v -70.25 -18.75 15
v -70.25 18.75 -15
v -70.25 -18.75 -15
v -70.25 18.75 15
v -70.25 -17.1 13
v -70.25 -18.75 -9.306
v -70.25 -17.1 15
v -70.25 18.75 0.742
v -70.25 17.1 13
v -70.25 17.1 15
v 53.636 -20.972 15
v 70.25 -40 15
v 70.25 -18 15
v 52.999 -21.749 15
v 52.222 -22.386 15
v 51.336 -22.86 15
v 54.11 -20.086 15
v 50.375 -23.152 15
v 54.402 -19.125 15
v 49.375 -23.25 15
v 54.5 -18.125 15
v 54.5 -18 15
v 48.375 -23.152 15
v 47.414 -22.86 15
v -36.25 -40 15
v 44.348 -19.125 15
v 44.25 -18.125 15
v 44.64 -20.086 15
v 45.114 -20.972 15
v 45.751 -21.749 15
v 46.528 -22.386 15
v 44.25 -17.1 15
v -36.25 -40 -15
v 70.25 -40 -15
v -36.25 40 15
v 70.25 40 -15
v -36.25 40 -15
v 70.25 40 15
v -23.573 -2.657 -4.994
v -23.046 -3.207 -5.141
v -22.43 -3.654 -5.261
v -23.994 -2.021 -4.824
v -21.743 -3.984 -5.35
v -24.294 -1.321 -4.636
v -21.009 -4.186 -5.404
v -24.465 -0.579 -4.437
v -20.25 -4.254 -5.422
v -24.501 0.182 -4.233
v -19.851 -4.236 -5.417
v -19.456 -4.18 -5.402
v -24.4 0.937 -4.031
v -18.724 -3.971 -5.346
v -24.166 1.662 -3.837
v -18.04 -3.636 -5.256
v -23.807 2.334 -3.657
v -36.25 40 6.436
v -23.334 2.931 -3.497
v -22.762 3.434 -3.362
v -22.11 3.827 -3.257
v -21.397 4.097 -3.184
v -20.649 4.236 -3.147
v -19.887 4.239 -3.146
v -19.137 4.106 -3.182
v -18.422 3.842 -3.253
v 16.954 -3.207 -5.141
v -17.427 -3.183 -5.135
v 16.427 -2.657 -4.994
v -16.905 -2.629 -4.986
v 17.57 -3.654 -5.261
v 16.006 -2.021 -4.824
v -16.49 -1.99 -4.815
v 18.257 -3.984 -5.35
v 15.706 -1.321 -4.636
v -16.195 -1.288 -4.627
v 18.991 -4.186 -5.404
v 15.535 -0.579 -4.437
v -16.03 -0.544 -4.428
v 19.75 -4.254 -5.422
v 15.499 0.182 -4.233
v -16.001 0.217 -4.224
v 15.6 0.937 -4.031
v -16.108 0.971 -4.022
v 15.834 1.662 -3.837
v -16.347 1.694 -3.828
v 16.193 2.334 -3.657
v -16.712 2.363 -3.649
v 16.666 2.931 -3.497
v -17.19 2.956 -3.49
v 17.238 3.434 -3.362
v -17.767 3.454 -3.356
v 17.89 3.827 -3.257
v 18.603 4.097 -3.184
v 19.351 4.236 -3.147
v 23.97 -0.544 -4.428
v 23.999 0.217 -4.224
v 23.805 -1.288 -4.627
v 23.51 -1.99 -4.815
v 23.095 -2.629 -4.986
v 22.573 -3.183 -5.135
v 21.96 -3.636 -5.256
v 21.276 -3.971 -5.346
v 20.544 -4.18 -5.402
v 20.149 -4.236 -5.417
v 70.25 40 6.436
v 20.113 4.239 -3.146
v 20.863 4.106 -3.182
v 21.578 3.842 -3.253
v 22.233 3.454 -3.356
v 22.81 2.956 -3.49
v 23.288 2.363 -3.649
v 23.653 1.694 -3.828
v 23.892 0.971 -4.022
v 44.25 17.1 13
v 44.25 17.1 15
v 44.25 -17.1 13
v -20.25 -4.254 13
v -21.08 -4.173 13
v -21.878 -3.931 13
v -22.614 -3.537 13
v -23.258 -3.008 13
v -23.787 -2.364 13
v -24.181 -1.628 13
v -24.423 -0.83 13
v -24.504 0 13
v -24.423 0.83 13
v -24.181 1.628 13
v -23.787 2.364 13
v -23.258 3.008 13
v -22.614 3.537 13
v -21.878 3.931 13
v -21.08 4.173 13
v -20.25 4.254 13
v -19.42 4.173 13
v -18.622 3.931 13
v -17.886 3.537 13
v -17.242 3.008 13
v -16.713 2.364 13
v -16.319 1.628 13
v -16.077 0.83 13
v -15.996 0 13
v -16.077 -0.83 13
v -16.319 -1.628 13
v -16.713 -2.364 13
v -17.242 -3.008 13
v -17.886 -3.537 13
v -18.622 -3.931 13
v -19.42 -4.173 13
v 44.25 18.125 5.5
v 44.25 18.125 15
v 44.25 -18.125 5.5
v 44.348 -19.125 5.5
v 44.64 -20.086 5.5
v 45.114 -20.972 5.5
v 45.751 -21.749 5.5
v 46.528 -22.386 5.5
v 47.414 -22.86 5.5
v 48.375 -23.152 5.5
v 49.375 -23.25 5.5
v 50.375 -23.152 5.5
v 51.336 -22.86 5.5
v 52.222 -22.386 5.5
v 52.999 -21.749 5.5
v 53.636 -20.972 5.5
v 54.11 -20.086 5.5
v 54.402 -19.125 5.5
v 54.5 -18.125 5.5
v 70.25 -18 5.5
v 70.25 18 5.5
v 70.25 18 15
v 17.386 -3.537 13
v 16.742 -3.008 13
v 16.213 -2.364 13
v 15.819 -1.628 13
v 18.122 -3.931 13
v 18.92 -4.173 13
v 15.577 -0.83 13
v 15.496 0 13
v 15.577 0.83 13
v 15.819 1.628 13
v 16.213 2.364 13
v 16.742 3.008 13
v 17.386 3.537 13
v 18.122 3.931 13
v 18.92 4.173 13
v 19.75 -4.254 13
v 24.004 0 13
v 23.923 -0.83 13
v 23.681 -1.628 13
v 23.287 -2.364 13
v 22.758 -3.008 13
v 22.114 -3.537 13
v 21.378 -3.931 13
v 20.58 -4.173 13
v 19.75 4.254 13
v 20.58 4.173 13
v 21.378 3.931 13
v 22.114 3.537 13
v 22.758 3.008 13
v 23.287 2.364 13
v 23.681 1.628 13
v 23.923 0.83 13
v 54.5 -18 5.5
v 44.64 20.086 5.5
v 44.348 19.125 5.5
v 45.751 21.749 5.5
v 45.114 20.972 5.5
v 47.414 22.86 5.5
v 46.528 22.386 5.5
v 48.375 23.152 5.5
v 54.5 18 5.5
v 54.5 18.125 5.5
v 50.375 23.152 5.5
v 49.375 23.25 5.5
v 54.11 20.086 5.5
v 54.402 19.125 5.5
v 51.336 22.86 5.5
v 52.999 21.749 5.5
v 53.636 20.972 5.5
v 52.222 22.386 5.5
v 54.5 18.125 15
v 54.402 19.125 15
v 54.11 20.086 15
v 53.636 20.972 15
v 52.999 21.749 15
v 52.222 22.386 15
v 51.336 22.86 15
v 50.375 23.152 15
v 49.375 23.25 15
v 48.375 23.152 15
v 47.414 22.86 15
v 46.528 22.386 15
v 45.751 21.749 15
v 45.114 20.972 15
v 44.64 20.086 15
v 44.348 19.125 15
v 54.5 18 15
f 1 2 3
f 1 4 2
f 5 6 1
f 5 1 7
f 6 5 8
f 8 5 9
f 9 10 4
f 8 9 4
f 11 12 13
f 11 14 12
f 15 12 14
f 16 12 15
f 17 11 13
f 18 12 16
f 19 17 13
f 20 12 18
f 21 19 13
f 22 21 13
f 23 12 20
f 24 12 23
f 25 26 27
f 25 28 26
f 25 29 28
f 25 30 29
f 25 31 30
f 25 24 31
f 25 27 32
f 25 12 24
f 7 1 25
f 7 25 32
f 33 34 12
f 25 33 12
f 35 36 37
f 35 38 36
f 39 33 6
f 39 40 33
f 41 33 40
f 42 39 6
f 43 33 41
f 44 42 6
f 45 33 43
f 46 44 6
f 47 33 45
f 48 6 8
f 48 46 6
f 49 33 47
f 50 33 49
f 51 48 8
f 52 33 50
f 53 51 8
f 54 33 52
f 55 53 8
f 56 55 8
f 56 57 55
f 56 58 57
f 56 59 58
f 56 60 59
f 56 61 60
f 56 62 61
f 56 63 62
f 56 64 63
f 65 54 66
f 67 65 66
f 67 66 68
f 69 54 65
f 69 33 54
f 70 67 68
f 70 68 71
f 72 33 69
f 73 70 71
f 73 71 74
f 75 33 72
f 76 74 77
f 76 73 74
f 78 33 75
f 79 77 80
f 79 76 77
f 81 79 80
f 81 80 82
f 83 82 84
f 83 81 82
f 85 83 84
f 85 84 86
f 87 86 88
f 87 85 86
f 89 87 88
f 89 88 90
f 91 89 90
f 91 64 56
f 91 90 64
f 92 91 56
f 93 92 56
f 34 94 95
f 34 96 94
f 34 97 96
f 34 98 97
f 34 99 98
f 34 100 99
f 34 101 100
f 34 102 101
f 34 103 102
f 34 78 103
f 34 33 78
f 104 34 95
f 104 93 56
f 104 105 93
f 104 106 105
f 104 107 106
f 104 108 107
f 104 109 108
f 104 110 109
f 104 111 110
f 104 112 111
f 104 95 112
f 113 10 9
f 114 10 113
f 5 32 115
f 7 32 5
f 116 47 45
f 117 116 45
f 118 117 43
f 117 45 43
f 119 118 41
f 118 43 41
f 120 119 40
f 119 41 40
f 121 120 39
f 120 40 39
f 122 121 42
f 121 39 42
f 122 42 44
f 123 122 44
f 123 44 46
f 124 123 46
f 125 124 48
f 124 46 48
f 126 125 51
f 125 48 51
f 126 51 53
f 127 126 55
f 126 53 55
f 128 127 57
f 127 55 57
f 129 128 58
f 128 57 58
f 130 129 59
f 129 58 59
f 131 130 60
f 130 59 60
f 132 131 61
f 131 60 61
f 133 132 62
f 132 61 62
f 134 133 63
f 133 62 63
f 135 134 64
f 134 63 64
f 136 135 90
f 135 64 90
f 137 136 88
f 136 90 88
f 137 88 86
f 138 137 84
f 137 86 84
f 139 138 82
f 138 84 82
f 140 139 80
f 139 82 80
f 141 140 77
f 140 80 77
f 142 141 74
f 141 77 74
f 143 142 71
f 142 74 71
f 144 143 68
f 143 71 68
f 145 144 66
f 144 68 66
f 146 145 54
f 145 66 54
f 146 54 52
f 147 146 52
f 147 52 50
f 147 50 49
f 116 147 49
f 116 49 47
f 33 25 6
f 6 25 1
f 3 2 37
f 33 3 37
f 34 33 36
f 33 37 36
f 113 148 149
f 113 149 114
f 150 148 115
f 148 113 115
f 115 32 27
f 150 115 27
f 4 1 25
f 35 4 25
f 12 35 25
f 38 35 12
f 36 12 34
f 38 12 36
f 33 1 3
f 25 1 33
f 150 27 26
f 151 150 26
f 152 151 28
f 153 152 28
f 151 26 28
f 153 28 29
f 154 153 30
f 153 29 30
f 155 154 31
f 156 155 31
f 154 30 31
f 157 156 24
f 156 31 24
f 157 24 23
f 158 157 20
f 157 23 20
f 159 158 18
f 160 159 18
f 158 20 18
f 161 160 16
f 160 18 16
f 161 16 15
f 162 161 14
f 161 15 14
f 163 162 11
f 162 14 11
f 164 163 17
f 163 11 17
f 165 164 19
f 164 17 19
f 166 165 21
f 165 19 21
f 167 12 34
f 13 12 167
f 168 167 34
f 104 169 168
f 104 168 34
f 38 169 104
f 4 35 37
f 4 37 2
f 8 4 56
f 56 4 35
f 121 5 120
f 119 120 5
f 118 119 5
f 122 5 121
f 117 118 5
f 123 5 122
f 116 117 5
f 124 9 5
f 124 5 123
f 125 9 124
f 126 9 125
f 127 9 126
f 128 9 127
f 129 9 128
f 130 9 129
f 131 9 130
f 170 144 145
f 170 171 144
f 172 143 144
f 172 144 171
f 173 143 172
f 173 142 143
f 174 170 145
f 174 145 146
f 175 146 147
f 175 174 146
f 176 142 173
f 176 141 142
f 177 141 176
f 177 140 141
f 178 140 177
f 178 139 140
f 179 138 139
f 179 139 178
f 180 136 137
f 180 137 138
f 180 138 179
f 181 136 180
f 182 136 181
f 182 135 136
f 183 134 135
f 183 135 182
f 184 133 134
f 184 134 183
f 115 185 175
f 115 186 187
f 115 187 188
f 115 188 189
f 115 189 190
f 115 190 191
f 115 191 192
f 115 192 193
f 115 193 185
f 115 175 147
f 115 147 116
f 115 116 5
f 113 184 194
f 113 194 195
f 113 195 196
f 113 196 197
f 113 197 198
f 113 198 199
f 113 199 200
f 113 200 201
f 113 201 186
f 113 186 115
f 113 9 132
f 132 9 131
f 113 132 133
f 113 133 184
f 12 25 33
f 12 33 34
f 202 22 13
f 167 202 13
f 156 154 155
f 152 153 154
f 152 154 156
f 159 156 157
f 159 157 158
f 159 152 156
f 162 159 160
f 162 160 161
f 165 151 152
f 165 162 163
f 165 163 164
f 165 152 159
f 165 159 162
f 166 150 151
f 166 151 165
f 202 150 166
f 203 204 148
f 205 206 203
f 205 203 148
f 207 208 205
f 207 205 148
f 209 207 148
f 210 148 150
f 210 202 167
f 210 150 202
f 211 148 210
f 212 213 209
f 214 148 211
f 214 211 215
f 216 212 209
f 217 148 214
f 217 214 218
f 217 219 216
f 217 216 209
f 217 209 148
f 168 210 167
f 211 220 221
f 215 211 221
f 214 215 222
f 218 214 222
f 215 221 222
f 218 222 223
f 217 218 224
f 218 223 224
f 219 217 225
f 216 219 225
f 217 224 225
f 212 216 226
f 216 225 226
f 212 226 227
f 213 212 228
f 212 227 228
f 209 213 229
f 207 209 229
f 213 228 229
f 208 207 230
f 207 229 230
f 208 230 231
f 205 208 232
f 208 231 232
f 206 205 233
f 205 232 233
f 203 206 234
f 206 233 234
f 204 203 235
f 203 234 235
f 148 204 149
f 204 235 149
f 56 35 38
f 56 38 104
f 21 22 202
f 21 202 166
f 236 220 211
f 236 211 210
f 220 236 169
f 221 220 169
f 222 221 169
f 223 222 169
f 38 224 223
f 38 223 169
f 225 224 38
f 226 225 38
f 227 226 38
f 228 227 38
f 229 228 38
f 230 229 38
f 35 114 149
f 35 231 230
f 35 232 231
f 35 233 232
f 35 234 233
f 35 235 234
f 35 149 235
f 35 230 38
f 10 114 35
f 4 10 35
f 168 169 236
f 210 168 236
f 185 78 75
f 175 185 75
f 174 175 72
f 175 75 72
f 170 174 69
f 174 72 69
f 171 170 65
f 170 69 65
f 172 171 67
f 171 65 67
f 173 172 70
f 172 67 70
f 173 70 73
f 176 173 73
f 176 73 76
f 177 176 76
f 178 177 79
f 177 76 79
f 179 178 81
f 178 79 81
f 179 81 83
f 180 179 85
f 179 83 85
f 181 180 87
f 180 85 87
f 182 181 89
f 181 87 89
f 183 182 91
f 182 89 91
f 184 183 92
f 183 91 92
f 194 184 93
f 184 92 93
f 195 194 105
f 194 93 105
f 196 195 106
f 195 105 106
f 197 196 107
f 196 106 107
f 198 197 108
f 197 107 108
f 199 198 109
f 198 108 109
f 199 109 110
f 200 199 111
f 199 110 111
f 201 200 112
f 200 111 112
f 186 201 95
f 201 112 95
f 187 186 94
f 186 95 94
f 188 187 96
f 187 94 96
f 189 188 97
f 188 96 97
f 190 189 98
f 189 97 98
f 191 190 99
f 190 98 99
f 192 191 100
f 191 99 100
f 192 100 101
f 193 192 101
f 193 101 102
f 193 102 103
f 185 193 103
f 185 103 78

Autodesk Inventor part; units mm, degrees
ref_plane "Work Plane1" through (-36.25, -40, 33.1737) normal (0, 0, -1) x (-1, 0, 0)
ref_plane "Right" through (0, 0, 0) normal (1, 0, 0) x (0, 1, 0)
ref_plane "Top" through (0, 0, 0) normal (0, 1, 0) x (-1, 0, 0)
sketch "Sketch1" plane through (0, 0, 0) normal (1, 0, 0) x (0, 1, 0)
  line L0 (-40, 15) -> (40, 15)
  line L1 (40, 15) -> (40, -15)
  line L2 (40, -15) -> (-40, -15)
  line L3 (-40, -15) -> (-40, 15)
  line L4 (-40, 15) -> (40, -15) construction
  line L5 (40, 15) -> (-40, -15) construction
  point P0 (0, 0)
  dimension "d0" = 30
  dimension "d1" = 80
extrude "Extrusion1" add sketch "Sketch1" along normal mid plane 140.5
sketch "Sketch2" plane through (-70.25, -40, 15) normal (0, 0, 1) x (1, 0, 0)
  line L0 (140.5, 80) -> (0, 80) construction
  line L1 (0, 0) -> (0, 80) construction
  line L2 (0, 80) -> (0, 58.75)
  line L3 (0, 58.75) -> (34, 80)
  line L4 (34, 80) -> (0, 80)
  line L5 (0, 21.25) -> (0, 0)
  line L6 (0, 0) -> (34, 0)
  line L7 (34, 0) -> (0, 21.25)
  point P0 (70.25, 40)
  dimension "d4" = 37.5
  dimension "d5" = 106.5
  dimension "d6" = 147.995
extrude "Extrusion2" cut sketch "Sketch2" against normal through all
sketch "Sketch3" plane through (70.25, -40, 15) normal (0, 0, 1) x (1, 0, 0)
  line L0 (0, 80) -> (0, 0) construction
  line L1 (-140.5, 21.25) -> (-140.5, 58.75) construction
  line L2 (-140.5, 57.1) -> (0, 57.1)
  line L3 (0, 57.1) -> (0, 22.9)
  line L4 (0, 22.9) -> (-140.5, 22.9)
  line L5 (-140.5, 22.9) -> (-140.5, 57.1)
  point P0 (-70.25, 40)
  point P1 (-140.5, 40)
  dimension "d9" = 34.2
extrude "Extrusion3" cut sketch "Sketch3" against normal blind 2
sketch "Sketch4" plane through (-36.25, 40, 15) normal (0, 0, 1) x (1, 0, 0)
  line L0 (106.5, -57.1) -> (-34, -57.1) construction
  line L1 (-34, -58.75) -> (-34, -57.1) construction
  line L2 (-34, -58.75) -> (0, -80) construction
  line L3 (0, -80) -> (106.5, -80) construction
  line L4 (106.5, -57.1) -> (106.5, -80) construction
  line L5 (-34, -22.9) -> (106.5, -22.9) construction
  line L6 (-34, -57.1) -> (-34, -22.9) construction
  line L7 (106.5, -57.1) -> (-34, -57.1) construction
  line L8 (106.5, -22.9) -> (106.5, -57.1) construction
  line L9 (106.5, -22) -> (80.5, -22)
  line L10 (80.5, -22) -> (80.5, -58)
  line L11 (80.5, -58) -> (106.5, -58)
  line L12 (106.5, -58) -> (106.5, -22)
  line L13 (85.625, -21.875) -> (85.625, -58.125) construction
  line L14 (90.75, -21.875) -> (90.75, -58.125)
  line L15 (80.5, -58.125) -> (80.5, -21.875)
  arc A0 (90.75, -21.875) -> (80.5, -21.875) centre (85.625, -21.875) ccw
  arc A1 (80.5, -58.125) -> (90.75, -58.125) centre (85.625, -58.125) ccw
  point P0 (36.25, -40)
  point P1 (106.5, -40)
  point P2 (85.625, -40)
  point P3 (80.5, -40)
  dimension "d12" = 36
  dimension "d13" = 26
  dimension "d14" = 46.5
  dimension "d15" = 15.75
extrude "Extrusion4" cut sketch "Sketch4" against normal blind 9.5
sketch "Sketch5" plane through (70.25, -40, 13) normal (0, 0, 1) x (1, 0, 0)
  line L0 (-26, 22.9) -> (-26, 57.1) construction
  line L1 (-15.75, 58) -> (0, 58) construction
  line L2 (-15.75, 58.125) -> (-15.75, 58) construction
  arc A0 (-15.75, 58.125) -> (-26, 58.125) centre (-20.875, 58.125) ccw construction
  line L3 (-26, 21.875) -> (-26, 58.125) construction
  arc A1 (-26, 21.875) -> (-15.75, 21.875) centre (-20.875, 21.875) ccw construction
  line L4 (-15.75, 22) -> (-15.75, 21.875) construction
  line L5 (0, 22) -> (-15.75, 22) construction
  line L6 (0, 58) -> (0, 22) construction
  line L7 (-90.5, 40) -> (-50.5, 40)
  circle A2 centre (-90.5, 40) radius 4.25
  circle A3 centre (-50.5, 40) radius 4.25
  point P0 (-70.25, 40)
  dimension "d18" = 8.5
  dimension "d19" = 48.5
  dimension "d20" = 20.25
  dimension "d23" = 50.5
  dimension "d24" = 40
hole "Hole1" at (-20.25, 0, 13) at (19.75, 0, 13) direction (0, 0, -1) diameter 8.509 end through all
sketch "Sketch6" plane through (70.25, 0, 0) normal (1, 0, 0) x (0, 0, -1)
  line L0 (15, -40) -> (15, 40) construction
  line L1 (15, 40) -> (-15, 40) construction
  line L2 (15, -40) -> (-6.4359, 40)
  line L3 (-6.4359, 40) -> (15, 40)
  line L4 (15, 40) -> (15, -40)
  point P0 (0, 0)
  dimension "d32" = 15
extrude "Extrusion5" cut sketch "Sketch6" against normal through all
sketch "Sketch7" plane through (-36.25, -40, 15) normal (0, 0, 1) x (1, 0, 0)
  line L0 (80.5, 57.1) -> (80.5, 58.125) construction
  arc A0 (90.75, 58.125) -> (80.5, 58.125) centre (85.625, 58.125) ccw construction
  line L1 (90.75, 58.125) -> (90.75, 58) construction
  line L2 (90.75, 58) -> (106.5, 58) construction
  line L3 (106.5, 80) -> (106.5, 58) construction
  line L4 (106.5, 80) -> (0, 80) construction
  line L5 (0, 80) -> (-34, 58.75) construction
  line L6 (-34, 57.1) -> (-34, 58.75) construction
  line L7 (-34, 57.1) -> (80.5, 57.1) construction
  line L8 (106.5, 80) -> (0, 80) construction
  line L9 (106.5, 0) -> (106.5, 80)
  line L10 (106.5, 80) -> (0, 80) construction
  line L11 (106.5, 80) -> (0, 80)
  line L12 (0, 80) -> (-34, 58.75)
  line L13 (0, 80) -> (-34, 58.75) construction
  line L14 (-34, 58.75) -> (-34, 21.25)
  line L15 (-34, 21.25) -> (0, 0)
  line L16 (106.5, 0) -> (106.5, 80) construction
  line L17 (0, 0) -> (106.5, 0)
  point P0 (36.25, 40)
extrude "Extrusion6" add sketch "Sketch7" against normal up to surface (30 mm away) separate body
sketch "Sketch8" plane through (70.25, -40, 13) normal (0, 0, 1) x (1, 0, 0)
  circle A0 centre (-90.5, 40) radius 4.2545 construction
  circle A1 centre (-50.5, 40) radius 4.2545 construction
  line L0 (-26, 22.9) -> (-26, 57.1) construction
  line L1 (-140.5, 57.1) -> (-26, 57.1) construction
  line L2 (-140.5, 22.9) -> (-140.5, 57.1) construction
  line L3 (-26, 22.9) -> (-140.5, 22.9) construction
  line L4 (0, 58) -> (0, 22) construction
  line L5 (12.7, 57.1) -> (-162.725, 57.1)
  line L6 (-162.725, 57.1) -> (-162.725, 22.9)
  line L7 (-162.725, 22.9) -> (12.7, 22.9)
  point P0 (-70.25, 40)
  dimension "d39" = 22.225
  dimension "d40" = 12.7
sketch "Sketch9" plane through (70.25, 40, 6.4359) normal (0, 0.258819, -0.9659258) x (-1, 0, 0)
  line L0 (140.5, -60.8225) -> (106.5, -82.8221) construction
  line L1 (140.5, -21.9996) -> (140.5, -60.8225) construction
  line L2 (106.5, 0) -> (140.5, -21.9996) construction
  line L3 (0, 0) -> (106.5, 0) construction
  line L4 (0, -82.8221) -> (0, 0) construction
  line L5 (0, -82.8221) -> (106.5, -82.8221) construction
  ellipse E0 centre (90.5, -41.411) end of major axis (90.5, -37.0065) minor radius 4.2545 construction
  ellipse E1 centre (50.5, -41.411) end of major axis (50.5, -37.0065) minor radius 4.2545 construction
  line L6 (0, -41.411) -> (140.5, -41.411)
  point P0 (70.25, -40.3028)
sketch "Sketch10" plane through (-36.25, -40, 15) normal (0, 0, 1) x (1, 0, 0)
  line L0 (80.5, 57.1) -> (80.5, 58.125) construction
  arc A0 (90.75, 58.125) -> (80.5, 58.125) centre (85.625, 58.125) ccw construction
  line L1 (90.75, 58.125) -> (90.75, 58) construction
  line L2 (90.75, 58) -> (106.5, 58) construction
  line L3 (106.5, 80) -> (106.5, 58) construction
  line L4 (106.5, 80) -> (0, 80) construction
  line L5 (0, 80) -> (-34, 58.75) construction
  line L6 (-34, 57.1) -> (-34, 58.75) construction
  line L7 (-34, 57.1) -> (80.5, 57.1) construction
  line L8 (90.75, 58) -> (106.5, 58) construction
  line L9 (90.75, 58.125) -> (90.75, 58) construction
  arc A1 (90.75, 58.125) -> (80.5, 58.125) centre (85.625, 58.125) ccw construction
  line L10 (80.5, 21.875) -> (80.5, 58.125) construction
  arc A2 (80.5, 21.875) -> (90.75, 21.875) centre (85.625, 21.875) ccw construction
  line L11 (90.75, 22) -> (90.75, 21.875) construction
  line L12 (106.5, 22) -> (90.75, 22) construction
  line L13 (106.5, 58) -> (106.5, 22) construction
  circle A3 centre (16, 40) radius 4.2545 construction
  circle A4 centre (56, 40) radius 4.2545 construction
  line L14 (80.5, 22.9) -> (80.5, 57.1) construction
  line L15 (-34, 57.1) -> (80.5, 57.1) construction
  line L16 (-34, 22.9) -> (-34, 57.1) construction
  line L17 (80.5, 22.9) -> (-34, 22.9) construction
  line L18 (112.45, 94.0004) -> (-39.95, 94.0004)
  line L19 (-39.95, 94.0004) -> (-39.95, -14.0004)
  line L20 (-39.95, -14.0004) -> (112.45, -14.0004)
  line L21 (112.45, -14.0004) -> (112.45, 94.0004)
  line L22 (-34, 40) -> (106.5, 40) construction
  line L23 (112.45, 94.0004) -> (-39.95, -14.0004) construction
  point P0 (36.25, 40)
  point P1 (36.25, 40)
  dimension "d41" = 152.4
  dimension "d42" = 108.0008
sketch "Sketch13" plane through (76.2, -54.0004, 15) normal (1, 0, 0) x (0, 0, -1)
  line L0 (0, 0) -> (0, 108.0008) construction
  line L1 (0, 0) -> (-36.8046, 0) construction
  line L2 (-10.5083, 0) -> (-36.8046, 98.139)
  line L3 (30, 14.0004) -> (8.5641, 94.0004) construction
  line L4 (-36.8046, 108.0008) -> (-36.8046, 0)
  line L5 (-10.5083, 0) -> (-36.8046, 0)
  line L6 (-36.8046, 0) -> (-36.8046, 108.0008) construction
  line L7 (0, 108.0008) -> (-36.8046, 98.139)
  line L8 (0, 108.0008) -> (-36.8046, 108.0008)
  line L9 (-10.5083, 0) -> (0, 2.8157)
  line L10 (0, 2.8157) -> (0, 0)
  line L11 (0, 0) -> (-10.5083, 0)
  line L12 (-36.8046, 98.139) -> (-10.5083, 0)
  line L13 (-10.5083, 0) -> (-36.8046, 0)
  line L14 (-36.8046, 0) -> (-36.8046, 98.139)
  line L15 (0, 108.0008) -> (-36.8046, 108.0008) construction
  line L16 (0, 108.0008) -> (-36.8046, 98.139)
  line L17 (-36.8046, 98.139) -> (-36.8046, 108.0008)
  line L18 (-36.8046, 108.0008) -> (0, 108.0008)
  point P0 (15, 54.0004)
  dimension "d67" = 101.601
  dimension "d75" = 38.1029
sketch "Sketch12" plane through (-36.25, -40, 51.8046) normal (0, 0, 1) x (1, 0, 0)
  circle A0 centre (16, 40) radius 4.2545 construction
  circle A1 centre (56, 40) radius 4.2545 construction
  line L0 (80.5, 22.9) -> (80.5, 57.1) construction
  line L1 (-34, 57.1) -> (80.5, 57.1) construction
  line L2 (-34, 22.9) -> (-34, 57.1) construction
  line L3 (80.5, 22.9) -> (-34, 22.9) construction
  point P0 (36.25, 40)
sketch "Sketch15" plane through (-36.25, -40, 33.1737) normal (0, 0, -1) x (-1, 0, 0)
  circle A0 centre (-56, 40) radius 5.4991 construction
  circle A1 centre (-16, 40) radius 5.4991 construction
  line L0 (9.4, 65.4) -> (-81.4, 65.4)
  line L1 (-81.4, 65.4) -> (-81.4, -10.8)
  line L2 (-81.4, -10.8) -> (9.4, -10.8)
  line L3 (9.4, -10.8) -> (9.4, 65.4)
  line L4 (9.4, 65.4) -> (-81.4, -10.8) construction
  line L5 (-81.4, 65.4) -> (9.4, -10.8) construction
  point P0 (-36, 27.3)
  dimension "d76" = 25.4
  dimension "d77" = 25.4
  dimension "d78" = 25.4
  dimension "d79" = 50.8
sketch "Sketch17" plane through (76.2, -51.1847, 15) normal (1, 0, 0) x (0, 0, -1)
  line L0 (-10.5083, -2.8157) -> (0, 0) projected
  line L1 (0, 0) -> (0, 105.1851) projected
  line L2 (0, 105.1851) -> (-36.8046, 95.3233) projected
  line L3 (-36.8046, 95.3233) -> (-10.5083, -2.8157) projected
  line L4 (0, 0) -> (26.2963, 7.0461)
  line L5 (26.2963, 7.0461) -> (0, 105.1851)
  point P0 (15, 51.1847)
equation "\"BendRadius\" = Thickness"
equation "\"BendReliefWidth\" = 0.5 * Thickness"
equation "\"BendReliefDepth\" = 0.5 * Thickness"
equation "\"CornerReliefSize\" = 4 * Thickness"
equation "\"MinimumRemnant\" = 2 * Thickness"
equation "\"TransitionRadius\" = BendRadius"
equation "\"JacobiRadiusSize\" = BendRadius"
equation "\"Thickness\" = 6.35"
properties part number "DHC-1500-FF-02-003" material "A36"
